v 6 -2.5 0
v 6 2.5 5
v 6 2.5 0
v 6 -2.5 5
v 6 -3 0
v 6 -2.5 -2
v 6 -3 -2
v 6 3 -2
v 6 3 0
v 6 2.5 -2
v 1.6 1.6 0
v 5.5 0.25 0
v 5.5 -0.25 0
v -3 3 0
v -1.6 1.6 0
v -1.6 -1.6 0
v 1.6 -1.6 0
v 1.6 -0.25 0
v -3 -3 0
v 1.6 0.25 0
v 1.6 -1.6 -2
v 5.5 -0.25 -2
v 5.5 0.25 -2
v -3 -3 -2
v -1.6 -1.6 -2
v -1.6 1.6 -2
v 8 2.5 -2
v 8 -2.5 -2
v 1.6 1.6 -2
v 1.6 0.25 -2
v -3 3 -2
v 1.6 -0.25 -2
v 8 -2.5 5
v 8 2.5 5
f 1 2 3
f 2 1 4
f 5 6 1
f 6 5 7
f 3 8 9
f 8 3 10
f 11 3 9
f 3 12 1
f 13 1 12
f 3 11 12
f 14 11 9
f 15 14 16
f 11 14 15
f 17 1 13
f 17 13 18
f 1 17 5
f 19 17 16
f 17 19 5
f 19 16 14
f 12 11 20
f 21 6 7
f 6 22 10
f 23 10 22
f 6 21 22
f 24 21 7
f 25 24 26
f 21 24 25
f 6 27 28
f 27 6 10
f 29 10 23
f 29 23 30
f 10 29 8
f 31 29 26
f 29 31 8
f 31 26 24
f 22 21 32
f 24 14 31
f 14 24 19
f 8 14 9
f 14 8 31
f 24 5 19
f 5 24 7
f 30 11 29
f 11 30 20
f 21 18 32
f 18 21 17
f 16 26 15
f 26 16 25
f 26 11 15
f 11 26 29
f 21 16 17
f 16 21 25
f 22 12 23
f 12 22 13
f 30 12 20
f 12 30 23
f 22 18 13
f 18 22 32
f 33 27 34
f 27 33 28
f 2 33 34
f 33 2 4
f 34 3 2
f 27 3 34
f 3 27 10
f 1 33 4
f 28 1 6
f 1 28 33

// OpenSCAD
difference(){
	translate([-3,-3,-2])cube([9,6,2]);
	cube([3.2,3.2,10],center=true);
	translate([0,-.25,-3])cube([5.5,.5,10]);
}
translate([6,-2.5,-2])cube([2,5,7]);
